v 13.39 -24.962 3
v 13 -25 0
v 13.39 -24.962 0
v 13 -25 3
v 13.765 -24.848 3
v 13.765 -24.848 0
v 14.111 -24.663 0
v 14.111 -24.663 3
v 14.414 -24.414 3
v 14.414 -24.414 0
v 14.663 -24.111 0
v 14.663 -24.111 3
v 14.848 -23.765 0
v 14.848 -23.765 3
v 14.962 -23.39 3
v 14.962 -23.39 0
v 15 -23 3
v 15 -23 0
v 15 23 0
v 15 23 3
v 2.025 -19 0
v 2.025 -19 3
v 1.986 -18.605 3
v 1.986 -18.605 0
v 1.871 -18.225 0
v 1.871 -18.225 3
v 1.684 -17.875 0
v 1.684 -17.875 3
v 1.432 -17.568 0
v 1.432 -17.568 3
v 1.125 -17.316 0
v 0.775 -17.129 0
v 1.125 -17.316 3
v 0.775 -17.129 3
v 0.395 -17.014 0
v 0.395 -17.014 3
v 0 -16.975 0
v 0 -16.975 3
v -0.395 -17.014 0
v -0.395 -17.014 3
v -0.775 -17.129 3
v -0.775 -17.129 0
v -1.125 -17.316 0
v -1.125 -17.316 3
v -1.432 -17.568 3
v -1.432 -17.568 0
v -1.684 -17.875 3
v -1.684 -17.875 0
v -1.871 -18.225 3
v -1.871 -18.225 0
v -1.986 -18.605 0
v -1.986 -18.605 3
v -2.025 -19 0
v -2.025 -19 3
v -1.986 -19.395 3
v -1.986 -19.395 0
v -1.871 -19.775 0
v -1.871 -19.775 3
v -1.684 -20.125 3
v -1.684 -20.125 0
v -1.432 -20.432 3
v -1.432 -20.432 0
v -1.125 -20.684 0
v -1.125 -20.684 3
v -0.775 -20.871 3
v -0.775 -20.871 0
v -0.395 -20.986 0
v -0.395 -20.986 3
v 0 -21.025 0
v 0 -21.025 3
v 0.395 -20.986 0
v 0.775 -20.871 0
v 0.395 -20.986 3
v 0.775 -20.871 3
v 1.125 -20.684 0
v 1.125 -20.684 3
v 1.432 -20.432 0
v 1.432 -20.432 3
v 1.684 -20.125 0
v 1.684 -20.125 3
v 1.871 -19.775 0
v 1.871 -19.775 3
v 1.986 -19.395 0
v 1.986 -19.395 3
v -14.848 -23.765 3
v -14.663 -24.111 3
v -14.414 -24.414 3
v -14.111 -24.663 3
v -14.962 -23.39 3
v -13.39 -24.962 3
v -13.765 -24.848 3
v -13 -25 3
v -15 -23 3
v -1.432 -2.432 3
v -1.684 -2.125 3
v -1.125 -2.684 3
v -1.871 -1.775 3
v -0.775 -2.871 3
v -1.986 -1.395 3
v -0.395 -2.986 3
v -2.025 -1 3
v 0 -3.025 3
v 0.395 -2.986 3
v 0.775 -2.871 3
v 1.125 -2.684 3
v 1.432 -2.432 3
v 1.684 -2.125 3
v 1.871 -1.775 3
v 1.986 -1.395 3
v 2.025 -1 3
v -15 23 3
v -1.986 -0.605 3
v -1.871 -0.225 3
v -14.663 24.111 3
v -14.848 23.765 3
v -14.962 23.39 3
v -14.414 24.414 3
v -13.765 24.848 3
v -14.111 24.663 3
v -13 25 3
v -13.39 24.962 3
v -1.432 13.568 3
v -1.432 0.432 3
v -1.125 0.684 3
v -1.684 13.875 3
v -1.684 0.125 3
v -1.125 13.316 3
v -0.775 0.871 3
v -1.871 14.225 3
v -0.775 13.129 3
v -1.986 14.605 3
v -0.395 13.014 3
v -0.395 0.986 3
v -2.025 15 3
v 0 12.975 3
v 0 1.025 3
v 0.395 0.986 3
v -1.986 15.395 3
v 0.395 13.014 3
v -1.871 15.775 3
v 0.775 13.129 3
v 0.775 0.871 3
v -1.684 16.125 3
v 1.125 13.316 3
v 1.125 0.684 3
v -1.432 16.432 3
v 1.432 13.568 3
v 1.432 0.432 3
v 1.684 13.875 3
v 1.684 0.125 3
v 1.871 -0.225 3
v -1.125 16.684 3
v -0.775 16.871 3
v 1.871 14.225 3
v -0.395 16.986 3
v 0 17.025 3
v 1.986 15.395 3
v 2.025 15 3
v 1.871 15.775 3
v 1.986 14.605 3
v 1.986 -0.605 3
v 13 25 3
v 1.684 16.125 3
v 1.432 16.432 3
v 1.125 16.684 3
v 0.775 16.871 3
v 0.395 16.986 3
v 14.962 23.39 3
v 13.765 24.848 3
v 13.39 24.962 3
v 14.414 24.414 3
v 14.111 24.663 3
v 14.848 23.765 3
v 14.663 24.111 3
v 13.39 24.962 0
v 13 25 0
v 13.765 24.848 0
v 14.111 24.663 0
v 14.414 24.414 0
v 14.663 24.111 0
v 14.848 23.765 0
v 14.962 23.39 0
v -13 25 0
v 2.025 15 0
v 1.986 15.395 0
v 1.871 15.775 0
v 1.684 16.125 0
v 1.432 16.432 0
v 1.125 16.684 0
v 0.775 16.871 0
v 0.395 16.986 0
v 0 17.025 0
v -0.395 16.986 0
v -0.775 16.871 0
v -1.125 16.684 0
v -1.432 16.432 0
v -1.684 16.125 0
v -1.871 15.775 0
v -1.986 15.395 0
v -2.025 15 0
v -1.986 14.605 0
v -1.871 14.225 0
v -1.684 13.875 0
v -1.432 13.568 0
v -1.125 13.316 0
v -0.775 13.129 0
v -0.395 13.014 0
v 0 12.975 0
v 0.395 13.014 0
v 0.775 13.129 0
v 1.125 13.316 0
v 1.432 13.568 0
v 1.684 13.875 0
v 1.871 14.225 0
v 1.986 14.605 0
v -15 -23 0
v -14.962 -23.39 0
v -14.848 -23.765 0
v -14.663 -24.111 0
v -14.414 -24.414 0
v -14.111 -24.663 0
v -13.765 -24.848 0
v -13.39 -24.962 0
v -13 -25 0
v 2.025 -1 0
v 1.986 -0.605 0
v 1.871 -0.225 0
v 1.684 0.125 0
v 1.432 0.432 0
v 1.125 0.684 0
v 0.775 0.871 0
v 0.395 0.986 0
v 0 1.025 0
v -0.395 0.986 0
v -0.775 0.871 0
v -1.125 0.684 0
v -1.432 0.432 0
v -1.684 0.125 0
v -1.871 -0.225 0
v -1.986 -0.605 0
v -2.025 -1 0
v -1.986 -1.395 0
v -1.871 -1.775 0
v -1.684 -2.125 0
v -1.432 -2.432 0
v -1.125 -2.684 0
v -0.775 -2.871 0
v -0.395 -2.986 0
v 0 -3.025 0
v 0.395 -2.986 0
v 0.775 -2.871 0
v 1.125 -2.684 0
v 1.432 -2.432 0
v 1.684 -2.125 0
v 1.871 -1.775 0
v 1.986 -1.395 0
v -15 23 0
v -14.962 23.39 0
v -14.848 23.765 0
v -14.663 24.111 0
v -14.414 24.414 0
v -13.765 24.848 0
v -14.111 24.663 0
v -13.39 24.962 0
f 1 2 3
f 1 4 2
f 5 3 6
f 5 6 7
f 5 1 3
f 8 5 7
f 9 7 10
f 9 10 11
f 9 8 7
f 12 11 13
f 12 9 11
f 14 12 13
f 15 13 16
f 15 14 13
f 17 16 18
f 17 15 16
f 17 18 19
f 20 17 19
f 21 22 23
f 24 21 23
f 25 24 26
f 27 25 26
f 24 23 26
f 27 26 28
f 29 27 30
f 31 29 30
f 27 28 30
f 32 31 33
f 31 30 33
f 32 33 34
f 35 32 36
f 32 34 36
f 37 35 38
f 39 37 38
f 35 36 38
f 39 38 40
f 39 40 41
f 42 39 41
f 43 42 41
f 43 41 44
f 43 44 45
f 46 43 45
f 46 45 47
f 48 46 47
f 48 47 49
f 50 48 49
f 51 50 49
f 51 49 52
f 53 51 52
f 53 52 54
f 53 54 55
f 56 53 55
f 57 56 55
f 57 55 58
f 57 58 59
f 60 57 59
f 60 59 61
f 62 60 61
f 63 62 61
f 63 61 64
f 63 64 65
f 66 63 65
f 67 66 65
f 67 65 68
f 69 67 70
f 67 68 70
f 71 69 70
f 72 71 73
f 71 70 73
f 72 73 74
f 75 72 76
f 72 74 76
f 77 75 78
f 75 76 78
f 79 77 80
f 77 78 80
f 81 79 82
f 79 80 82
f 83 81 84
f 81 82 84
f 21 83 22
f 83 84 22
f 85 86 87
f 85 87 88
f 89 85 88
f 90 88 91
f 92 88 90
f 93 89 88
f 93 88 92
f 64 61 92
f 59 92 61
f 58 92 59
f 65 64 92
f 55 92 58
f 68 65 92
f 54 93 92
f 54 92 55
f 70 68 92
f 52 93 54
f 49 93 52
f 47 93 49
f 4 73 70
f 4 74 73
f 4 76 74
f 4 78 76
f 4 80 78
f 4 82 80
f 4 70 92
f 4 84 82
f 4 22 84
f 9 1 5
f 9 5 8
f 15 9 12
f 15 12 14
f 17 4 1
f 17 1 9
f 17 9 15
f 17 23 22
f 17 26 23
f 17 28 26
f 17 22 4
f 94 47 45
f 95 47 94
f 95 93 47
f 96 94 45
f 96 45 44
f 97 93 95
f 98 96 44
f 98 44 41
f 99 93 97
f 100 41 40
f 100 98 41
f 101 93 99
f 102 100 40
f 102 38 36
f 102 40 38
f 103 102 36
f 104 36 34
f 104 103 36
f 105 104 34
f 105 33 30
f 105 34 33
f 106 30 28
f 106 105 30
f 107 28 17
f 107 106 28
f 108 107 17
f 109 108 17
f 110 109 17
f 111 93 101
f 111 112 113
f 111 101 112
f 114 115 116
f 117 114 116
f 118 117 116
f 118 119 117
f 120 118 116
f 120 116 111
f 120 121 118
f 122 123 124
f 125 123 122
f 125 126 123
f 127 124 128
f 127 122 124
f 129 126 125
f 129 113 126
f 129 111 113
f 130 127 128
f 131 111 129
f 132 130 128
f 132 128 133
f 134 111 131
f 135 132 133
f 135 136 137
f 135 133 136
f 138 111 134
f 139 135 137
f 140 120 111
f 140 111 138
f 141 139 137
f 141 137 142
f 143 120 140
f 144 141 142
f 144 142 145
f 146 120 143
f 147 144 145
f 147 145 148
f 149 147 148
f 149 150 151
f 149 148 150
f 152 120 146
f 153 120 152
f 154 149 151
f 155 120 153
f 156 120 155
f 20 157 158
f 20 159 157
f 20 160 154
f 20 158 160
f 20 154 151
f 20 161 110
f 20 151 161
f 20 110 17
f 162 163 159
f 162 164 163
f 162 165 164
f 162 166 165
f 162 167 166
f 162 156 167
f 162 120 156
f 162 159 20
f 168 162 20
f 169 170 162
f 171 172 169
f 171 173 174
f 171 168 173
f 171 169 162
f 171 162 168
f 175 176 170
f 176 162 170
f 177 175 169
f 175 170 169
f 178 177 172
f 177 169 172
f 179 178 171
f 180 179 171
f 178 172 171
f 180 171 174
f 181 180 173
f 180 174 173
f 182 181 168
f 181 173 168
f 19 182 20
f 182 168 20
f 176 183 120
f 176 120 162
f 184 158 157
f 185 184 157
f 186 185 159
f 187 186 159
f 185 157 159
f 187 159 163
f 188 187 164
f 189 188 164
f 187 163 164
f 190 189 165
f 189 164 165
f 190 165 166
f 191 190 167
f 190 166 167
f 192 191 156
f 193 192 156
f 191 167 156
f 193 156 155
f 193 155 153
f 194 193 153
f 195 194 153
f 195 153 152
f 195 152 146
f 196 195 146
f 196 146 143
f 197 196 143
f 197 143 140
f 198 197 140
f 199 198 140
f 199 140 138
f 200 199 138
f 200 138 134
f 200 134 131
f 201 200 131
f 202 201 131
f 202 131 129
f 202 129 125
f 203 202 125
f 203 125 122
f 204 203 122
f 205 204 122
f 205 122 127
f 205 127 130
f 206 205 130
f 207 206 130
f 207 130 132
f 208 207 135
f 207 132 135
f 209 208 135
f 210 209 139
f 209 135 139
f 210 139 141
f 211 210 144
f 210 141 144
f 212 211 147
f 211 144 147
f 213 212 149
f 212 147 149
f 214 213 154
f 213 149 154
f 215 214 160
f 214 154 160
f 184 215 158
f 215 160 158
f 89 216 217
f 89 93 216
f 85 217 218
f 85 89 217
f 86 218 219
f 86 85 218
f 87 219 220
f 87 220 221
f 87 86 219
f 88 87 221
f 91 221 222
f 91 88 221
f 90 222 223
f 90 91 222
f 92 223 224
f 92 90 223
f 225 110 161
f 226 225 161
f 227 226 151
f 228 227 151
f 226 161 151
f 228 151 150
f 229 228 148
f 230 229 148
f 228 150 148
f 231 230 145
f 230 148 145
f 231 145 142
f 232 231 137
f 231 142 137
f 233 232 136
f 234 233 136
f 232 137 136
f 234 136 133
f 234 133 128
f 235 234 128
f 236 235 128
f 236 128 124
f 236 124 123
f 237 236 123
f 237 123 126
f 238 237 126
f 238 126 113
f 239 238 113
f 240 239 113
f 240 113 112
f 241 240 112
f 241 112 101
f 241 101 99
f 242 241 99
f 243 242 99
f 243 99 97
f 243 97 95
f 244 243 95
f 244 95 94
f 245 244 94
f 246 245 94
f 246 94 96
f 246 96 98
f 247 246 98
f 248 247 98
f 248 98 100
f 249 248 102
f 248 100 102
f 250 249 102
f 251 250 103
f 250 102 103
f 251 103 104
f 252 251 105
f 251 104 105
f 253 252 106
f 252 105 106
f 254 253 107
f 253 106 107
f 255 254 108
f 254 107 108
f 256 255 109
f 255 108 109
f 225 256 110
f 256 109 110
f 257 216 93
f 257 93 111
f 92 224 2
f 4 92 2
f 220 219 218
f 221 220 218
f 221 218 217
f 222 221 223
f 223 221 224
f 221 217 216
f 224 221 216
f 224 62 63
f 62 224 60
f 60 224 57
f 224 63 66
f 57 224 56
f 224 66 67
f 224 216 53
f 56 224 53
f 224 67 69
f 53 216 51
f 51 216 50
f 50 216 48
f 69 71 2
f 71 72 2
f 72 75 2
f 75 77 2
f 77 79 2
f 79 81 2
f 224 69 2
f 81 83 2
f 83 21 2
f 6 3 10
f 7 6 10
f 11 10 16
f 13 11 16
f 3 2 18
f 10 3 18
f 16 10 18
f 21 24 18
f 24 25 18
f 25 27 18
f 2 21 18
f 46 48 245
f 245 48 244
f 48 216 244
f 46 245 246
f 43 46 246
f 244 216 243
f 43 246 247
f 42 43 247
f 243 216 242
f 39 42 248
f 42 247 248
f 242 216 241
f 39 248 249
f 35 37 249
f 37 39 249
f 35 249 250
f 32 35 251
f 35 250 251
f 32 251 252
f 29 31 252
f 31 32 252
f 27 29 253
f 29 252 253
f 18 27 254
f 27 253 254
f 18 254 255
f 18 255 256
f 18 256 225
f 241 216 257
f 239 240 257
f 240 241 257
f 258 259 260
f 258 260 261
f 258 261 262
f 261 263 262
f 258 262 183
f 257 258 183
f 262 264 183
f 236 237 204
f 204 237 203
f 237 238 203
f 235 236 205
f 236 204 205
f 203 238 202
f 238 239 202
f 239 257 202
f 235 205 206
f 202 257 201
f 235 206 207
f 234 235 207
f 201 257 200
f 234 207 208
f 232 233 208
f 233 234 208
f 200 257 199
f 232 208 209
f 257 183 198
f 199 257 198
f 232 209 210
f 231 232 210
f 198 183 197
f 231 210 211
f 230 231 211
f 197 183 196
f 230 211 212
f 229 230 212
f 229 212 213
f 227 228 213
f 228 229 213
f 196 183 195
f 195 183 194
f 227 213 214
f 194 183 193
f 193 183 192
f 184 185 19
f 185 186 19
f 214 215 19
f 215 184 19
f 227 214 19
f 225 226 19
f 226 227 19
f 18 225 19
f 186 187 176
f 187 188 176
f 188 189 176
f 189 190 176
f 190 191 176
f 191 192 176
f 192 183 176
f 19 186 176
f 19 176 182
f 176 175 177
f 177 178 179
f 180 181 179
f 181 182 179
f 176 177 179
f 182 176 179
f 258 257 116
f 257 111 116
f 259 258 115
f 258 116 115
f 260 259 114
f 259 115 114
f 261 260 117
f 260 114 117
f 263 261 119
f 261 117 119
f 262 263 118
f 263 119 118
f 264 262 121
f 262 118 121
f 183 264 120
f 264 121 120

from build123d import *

# Parameters (mm, degrees)
SKETCH_1_W          = 30
SKETCH_1_H          = 50
EXTRUDE_1_DEPTH     = 3
SKETCH_2_R          = 2.025
CUT_EXTRUDE_1_DEPTH = 4
SKETCH_3_R          = 2.025
CUT_EXTRUDE_2_DEPTH = 34
FILLET_1_R          = 2


with BuildPart() as part:
    # 草图1 → 凸台-拉伸1 (new body)
    with BuildSketch(Plane.XY):
        Rectangle(SKETCH_1_W, SKETCH_1_H)
    extrude(amount=EXTRUDE_1_DEPTH)

    # 草图2 → 切除-拉伸1 (cut)
    with BuildSketch(Plane.XY.offset(3)):
        with Locations((0, 15)):
            Circle(SKETCH_2_R)
    extrude(amount=-CUT_EXTRUDE_1_DEPTH, mode=Mode.SUBTRACT)

    # 草图3 → 切除-拉伸2 (cut)
    with BuildSketch(Plane.XY.offset(3)):
        with Locations((0, -1)):
            Circle(SKETCH_3_R)
        with Locations((0, -19)):
            Circle(SKETCH_3_R)
    extrude(amount=-CUT_EXTRUDE_2_DEPTH, mode=Mode.SUBTRACT)

    # 圆角1
    fillet_1_edges = [part.edges().sort_by_distance(p)[0] for p in [
        (15, -25, 1.5),
        (-15, -25, 1.5),
        (-15, 25, 1.5),
        (15, 25, 1.5),
    ]]
    fillet(fillet_1_edges, radius=FILLET_1_R)


solid = part.part
